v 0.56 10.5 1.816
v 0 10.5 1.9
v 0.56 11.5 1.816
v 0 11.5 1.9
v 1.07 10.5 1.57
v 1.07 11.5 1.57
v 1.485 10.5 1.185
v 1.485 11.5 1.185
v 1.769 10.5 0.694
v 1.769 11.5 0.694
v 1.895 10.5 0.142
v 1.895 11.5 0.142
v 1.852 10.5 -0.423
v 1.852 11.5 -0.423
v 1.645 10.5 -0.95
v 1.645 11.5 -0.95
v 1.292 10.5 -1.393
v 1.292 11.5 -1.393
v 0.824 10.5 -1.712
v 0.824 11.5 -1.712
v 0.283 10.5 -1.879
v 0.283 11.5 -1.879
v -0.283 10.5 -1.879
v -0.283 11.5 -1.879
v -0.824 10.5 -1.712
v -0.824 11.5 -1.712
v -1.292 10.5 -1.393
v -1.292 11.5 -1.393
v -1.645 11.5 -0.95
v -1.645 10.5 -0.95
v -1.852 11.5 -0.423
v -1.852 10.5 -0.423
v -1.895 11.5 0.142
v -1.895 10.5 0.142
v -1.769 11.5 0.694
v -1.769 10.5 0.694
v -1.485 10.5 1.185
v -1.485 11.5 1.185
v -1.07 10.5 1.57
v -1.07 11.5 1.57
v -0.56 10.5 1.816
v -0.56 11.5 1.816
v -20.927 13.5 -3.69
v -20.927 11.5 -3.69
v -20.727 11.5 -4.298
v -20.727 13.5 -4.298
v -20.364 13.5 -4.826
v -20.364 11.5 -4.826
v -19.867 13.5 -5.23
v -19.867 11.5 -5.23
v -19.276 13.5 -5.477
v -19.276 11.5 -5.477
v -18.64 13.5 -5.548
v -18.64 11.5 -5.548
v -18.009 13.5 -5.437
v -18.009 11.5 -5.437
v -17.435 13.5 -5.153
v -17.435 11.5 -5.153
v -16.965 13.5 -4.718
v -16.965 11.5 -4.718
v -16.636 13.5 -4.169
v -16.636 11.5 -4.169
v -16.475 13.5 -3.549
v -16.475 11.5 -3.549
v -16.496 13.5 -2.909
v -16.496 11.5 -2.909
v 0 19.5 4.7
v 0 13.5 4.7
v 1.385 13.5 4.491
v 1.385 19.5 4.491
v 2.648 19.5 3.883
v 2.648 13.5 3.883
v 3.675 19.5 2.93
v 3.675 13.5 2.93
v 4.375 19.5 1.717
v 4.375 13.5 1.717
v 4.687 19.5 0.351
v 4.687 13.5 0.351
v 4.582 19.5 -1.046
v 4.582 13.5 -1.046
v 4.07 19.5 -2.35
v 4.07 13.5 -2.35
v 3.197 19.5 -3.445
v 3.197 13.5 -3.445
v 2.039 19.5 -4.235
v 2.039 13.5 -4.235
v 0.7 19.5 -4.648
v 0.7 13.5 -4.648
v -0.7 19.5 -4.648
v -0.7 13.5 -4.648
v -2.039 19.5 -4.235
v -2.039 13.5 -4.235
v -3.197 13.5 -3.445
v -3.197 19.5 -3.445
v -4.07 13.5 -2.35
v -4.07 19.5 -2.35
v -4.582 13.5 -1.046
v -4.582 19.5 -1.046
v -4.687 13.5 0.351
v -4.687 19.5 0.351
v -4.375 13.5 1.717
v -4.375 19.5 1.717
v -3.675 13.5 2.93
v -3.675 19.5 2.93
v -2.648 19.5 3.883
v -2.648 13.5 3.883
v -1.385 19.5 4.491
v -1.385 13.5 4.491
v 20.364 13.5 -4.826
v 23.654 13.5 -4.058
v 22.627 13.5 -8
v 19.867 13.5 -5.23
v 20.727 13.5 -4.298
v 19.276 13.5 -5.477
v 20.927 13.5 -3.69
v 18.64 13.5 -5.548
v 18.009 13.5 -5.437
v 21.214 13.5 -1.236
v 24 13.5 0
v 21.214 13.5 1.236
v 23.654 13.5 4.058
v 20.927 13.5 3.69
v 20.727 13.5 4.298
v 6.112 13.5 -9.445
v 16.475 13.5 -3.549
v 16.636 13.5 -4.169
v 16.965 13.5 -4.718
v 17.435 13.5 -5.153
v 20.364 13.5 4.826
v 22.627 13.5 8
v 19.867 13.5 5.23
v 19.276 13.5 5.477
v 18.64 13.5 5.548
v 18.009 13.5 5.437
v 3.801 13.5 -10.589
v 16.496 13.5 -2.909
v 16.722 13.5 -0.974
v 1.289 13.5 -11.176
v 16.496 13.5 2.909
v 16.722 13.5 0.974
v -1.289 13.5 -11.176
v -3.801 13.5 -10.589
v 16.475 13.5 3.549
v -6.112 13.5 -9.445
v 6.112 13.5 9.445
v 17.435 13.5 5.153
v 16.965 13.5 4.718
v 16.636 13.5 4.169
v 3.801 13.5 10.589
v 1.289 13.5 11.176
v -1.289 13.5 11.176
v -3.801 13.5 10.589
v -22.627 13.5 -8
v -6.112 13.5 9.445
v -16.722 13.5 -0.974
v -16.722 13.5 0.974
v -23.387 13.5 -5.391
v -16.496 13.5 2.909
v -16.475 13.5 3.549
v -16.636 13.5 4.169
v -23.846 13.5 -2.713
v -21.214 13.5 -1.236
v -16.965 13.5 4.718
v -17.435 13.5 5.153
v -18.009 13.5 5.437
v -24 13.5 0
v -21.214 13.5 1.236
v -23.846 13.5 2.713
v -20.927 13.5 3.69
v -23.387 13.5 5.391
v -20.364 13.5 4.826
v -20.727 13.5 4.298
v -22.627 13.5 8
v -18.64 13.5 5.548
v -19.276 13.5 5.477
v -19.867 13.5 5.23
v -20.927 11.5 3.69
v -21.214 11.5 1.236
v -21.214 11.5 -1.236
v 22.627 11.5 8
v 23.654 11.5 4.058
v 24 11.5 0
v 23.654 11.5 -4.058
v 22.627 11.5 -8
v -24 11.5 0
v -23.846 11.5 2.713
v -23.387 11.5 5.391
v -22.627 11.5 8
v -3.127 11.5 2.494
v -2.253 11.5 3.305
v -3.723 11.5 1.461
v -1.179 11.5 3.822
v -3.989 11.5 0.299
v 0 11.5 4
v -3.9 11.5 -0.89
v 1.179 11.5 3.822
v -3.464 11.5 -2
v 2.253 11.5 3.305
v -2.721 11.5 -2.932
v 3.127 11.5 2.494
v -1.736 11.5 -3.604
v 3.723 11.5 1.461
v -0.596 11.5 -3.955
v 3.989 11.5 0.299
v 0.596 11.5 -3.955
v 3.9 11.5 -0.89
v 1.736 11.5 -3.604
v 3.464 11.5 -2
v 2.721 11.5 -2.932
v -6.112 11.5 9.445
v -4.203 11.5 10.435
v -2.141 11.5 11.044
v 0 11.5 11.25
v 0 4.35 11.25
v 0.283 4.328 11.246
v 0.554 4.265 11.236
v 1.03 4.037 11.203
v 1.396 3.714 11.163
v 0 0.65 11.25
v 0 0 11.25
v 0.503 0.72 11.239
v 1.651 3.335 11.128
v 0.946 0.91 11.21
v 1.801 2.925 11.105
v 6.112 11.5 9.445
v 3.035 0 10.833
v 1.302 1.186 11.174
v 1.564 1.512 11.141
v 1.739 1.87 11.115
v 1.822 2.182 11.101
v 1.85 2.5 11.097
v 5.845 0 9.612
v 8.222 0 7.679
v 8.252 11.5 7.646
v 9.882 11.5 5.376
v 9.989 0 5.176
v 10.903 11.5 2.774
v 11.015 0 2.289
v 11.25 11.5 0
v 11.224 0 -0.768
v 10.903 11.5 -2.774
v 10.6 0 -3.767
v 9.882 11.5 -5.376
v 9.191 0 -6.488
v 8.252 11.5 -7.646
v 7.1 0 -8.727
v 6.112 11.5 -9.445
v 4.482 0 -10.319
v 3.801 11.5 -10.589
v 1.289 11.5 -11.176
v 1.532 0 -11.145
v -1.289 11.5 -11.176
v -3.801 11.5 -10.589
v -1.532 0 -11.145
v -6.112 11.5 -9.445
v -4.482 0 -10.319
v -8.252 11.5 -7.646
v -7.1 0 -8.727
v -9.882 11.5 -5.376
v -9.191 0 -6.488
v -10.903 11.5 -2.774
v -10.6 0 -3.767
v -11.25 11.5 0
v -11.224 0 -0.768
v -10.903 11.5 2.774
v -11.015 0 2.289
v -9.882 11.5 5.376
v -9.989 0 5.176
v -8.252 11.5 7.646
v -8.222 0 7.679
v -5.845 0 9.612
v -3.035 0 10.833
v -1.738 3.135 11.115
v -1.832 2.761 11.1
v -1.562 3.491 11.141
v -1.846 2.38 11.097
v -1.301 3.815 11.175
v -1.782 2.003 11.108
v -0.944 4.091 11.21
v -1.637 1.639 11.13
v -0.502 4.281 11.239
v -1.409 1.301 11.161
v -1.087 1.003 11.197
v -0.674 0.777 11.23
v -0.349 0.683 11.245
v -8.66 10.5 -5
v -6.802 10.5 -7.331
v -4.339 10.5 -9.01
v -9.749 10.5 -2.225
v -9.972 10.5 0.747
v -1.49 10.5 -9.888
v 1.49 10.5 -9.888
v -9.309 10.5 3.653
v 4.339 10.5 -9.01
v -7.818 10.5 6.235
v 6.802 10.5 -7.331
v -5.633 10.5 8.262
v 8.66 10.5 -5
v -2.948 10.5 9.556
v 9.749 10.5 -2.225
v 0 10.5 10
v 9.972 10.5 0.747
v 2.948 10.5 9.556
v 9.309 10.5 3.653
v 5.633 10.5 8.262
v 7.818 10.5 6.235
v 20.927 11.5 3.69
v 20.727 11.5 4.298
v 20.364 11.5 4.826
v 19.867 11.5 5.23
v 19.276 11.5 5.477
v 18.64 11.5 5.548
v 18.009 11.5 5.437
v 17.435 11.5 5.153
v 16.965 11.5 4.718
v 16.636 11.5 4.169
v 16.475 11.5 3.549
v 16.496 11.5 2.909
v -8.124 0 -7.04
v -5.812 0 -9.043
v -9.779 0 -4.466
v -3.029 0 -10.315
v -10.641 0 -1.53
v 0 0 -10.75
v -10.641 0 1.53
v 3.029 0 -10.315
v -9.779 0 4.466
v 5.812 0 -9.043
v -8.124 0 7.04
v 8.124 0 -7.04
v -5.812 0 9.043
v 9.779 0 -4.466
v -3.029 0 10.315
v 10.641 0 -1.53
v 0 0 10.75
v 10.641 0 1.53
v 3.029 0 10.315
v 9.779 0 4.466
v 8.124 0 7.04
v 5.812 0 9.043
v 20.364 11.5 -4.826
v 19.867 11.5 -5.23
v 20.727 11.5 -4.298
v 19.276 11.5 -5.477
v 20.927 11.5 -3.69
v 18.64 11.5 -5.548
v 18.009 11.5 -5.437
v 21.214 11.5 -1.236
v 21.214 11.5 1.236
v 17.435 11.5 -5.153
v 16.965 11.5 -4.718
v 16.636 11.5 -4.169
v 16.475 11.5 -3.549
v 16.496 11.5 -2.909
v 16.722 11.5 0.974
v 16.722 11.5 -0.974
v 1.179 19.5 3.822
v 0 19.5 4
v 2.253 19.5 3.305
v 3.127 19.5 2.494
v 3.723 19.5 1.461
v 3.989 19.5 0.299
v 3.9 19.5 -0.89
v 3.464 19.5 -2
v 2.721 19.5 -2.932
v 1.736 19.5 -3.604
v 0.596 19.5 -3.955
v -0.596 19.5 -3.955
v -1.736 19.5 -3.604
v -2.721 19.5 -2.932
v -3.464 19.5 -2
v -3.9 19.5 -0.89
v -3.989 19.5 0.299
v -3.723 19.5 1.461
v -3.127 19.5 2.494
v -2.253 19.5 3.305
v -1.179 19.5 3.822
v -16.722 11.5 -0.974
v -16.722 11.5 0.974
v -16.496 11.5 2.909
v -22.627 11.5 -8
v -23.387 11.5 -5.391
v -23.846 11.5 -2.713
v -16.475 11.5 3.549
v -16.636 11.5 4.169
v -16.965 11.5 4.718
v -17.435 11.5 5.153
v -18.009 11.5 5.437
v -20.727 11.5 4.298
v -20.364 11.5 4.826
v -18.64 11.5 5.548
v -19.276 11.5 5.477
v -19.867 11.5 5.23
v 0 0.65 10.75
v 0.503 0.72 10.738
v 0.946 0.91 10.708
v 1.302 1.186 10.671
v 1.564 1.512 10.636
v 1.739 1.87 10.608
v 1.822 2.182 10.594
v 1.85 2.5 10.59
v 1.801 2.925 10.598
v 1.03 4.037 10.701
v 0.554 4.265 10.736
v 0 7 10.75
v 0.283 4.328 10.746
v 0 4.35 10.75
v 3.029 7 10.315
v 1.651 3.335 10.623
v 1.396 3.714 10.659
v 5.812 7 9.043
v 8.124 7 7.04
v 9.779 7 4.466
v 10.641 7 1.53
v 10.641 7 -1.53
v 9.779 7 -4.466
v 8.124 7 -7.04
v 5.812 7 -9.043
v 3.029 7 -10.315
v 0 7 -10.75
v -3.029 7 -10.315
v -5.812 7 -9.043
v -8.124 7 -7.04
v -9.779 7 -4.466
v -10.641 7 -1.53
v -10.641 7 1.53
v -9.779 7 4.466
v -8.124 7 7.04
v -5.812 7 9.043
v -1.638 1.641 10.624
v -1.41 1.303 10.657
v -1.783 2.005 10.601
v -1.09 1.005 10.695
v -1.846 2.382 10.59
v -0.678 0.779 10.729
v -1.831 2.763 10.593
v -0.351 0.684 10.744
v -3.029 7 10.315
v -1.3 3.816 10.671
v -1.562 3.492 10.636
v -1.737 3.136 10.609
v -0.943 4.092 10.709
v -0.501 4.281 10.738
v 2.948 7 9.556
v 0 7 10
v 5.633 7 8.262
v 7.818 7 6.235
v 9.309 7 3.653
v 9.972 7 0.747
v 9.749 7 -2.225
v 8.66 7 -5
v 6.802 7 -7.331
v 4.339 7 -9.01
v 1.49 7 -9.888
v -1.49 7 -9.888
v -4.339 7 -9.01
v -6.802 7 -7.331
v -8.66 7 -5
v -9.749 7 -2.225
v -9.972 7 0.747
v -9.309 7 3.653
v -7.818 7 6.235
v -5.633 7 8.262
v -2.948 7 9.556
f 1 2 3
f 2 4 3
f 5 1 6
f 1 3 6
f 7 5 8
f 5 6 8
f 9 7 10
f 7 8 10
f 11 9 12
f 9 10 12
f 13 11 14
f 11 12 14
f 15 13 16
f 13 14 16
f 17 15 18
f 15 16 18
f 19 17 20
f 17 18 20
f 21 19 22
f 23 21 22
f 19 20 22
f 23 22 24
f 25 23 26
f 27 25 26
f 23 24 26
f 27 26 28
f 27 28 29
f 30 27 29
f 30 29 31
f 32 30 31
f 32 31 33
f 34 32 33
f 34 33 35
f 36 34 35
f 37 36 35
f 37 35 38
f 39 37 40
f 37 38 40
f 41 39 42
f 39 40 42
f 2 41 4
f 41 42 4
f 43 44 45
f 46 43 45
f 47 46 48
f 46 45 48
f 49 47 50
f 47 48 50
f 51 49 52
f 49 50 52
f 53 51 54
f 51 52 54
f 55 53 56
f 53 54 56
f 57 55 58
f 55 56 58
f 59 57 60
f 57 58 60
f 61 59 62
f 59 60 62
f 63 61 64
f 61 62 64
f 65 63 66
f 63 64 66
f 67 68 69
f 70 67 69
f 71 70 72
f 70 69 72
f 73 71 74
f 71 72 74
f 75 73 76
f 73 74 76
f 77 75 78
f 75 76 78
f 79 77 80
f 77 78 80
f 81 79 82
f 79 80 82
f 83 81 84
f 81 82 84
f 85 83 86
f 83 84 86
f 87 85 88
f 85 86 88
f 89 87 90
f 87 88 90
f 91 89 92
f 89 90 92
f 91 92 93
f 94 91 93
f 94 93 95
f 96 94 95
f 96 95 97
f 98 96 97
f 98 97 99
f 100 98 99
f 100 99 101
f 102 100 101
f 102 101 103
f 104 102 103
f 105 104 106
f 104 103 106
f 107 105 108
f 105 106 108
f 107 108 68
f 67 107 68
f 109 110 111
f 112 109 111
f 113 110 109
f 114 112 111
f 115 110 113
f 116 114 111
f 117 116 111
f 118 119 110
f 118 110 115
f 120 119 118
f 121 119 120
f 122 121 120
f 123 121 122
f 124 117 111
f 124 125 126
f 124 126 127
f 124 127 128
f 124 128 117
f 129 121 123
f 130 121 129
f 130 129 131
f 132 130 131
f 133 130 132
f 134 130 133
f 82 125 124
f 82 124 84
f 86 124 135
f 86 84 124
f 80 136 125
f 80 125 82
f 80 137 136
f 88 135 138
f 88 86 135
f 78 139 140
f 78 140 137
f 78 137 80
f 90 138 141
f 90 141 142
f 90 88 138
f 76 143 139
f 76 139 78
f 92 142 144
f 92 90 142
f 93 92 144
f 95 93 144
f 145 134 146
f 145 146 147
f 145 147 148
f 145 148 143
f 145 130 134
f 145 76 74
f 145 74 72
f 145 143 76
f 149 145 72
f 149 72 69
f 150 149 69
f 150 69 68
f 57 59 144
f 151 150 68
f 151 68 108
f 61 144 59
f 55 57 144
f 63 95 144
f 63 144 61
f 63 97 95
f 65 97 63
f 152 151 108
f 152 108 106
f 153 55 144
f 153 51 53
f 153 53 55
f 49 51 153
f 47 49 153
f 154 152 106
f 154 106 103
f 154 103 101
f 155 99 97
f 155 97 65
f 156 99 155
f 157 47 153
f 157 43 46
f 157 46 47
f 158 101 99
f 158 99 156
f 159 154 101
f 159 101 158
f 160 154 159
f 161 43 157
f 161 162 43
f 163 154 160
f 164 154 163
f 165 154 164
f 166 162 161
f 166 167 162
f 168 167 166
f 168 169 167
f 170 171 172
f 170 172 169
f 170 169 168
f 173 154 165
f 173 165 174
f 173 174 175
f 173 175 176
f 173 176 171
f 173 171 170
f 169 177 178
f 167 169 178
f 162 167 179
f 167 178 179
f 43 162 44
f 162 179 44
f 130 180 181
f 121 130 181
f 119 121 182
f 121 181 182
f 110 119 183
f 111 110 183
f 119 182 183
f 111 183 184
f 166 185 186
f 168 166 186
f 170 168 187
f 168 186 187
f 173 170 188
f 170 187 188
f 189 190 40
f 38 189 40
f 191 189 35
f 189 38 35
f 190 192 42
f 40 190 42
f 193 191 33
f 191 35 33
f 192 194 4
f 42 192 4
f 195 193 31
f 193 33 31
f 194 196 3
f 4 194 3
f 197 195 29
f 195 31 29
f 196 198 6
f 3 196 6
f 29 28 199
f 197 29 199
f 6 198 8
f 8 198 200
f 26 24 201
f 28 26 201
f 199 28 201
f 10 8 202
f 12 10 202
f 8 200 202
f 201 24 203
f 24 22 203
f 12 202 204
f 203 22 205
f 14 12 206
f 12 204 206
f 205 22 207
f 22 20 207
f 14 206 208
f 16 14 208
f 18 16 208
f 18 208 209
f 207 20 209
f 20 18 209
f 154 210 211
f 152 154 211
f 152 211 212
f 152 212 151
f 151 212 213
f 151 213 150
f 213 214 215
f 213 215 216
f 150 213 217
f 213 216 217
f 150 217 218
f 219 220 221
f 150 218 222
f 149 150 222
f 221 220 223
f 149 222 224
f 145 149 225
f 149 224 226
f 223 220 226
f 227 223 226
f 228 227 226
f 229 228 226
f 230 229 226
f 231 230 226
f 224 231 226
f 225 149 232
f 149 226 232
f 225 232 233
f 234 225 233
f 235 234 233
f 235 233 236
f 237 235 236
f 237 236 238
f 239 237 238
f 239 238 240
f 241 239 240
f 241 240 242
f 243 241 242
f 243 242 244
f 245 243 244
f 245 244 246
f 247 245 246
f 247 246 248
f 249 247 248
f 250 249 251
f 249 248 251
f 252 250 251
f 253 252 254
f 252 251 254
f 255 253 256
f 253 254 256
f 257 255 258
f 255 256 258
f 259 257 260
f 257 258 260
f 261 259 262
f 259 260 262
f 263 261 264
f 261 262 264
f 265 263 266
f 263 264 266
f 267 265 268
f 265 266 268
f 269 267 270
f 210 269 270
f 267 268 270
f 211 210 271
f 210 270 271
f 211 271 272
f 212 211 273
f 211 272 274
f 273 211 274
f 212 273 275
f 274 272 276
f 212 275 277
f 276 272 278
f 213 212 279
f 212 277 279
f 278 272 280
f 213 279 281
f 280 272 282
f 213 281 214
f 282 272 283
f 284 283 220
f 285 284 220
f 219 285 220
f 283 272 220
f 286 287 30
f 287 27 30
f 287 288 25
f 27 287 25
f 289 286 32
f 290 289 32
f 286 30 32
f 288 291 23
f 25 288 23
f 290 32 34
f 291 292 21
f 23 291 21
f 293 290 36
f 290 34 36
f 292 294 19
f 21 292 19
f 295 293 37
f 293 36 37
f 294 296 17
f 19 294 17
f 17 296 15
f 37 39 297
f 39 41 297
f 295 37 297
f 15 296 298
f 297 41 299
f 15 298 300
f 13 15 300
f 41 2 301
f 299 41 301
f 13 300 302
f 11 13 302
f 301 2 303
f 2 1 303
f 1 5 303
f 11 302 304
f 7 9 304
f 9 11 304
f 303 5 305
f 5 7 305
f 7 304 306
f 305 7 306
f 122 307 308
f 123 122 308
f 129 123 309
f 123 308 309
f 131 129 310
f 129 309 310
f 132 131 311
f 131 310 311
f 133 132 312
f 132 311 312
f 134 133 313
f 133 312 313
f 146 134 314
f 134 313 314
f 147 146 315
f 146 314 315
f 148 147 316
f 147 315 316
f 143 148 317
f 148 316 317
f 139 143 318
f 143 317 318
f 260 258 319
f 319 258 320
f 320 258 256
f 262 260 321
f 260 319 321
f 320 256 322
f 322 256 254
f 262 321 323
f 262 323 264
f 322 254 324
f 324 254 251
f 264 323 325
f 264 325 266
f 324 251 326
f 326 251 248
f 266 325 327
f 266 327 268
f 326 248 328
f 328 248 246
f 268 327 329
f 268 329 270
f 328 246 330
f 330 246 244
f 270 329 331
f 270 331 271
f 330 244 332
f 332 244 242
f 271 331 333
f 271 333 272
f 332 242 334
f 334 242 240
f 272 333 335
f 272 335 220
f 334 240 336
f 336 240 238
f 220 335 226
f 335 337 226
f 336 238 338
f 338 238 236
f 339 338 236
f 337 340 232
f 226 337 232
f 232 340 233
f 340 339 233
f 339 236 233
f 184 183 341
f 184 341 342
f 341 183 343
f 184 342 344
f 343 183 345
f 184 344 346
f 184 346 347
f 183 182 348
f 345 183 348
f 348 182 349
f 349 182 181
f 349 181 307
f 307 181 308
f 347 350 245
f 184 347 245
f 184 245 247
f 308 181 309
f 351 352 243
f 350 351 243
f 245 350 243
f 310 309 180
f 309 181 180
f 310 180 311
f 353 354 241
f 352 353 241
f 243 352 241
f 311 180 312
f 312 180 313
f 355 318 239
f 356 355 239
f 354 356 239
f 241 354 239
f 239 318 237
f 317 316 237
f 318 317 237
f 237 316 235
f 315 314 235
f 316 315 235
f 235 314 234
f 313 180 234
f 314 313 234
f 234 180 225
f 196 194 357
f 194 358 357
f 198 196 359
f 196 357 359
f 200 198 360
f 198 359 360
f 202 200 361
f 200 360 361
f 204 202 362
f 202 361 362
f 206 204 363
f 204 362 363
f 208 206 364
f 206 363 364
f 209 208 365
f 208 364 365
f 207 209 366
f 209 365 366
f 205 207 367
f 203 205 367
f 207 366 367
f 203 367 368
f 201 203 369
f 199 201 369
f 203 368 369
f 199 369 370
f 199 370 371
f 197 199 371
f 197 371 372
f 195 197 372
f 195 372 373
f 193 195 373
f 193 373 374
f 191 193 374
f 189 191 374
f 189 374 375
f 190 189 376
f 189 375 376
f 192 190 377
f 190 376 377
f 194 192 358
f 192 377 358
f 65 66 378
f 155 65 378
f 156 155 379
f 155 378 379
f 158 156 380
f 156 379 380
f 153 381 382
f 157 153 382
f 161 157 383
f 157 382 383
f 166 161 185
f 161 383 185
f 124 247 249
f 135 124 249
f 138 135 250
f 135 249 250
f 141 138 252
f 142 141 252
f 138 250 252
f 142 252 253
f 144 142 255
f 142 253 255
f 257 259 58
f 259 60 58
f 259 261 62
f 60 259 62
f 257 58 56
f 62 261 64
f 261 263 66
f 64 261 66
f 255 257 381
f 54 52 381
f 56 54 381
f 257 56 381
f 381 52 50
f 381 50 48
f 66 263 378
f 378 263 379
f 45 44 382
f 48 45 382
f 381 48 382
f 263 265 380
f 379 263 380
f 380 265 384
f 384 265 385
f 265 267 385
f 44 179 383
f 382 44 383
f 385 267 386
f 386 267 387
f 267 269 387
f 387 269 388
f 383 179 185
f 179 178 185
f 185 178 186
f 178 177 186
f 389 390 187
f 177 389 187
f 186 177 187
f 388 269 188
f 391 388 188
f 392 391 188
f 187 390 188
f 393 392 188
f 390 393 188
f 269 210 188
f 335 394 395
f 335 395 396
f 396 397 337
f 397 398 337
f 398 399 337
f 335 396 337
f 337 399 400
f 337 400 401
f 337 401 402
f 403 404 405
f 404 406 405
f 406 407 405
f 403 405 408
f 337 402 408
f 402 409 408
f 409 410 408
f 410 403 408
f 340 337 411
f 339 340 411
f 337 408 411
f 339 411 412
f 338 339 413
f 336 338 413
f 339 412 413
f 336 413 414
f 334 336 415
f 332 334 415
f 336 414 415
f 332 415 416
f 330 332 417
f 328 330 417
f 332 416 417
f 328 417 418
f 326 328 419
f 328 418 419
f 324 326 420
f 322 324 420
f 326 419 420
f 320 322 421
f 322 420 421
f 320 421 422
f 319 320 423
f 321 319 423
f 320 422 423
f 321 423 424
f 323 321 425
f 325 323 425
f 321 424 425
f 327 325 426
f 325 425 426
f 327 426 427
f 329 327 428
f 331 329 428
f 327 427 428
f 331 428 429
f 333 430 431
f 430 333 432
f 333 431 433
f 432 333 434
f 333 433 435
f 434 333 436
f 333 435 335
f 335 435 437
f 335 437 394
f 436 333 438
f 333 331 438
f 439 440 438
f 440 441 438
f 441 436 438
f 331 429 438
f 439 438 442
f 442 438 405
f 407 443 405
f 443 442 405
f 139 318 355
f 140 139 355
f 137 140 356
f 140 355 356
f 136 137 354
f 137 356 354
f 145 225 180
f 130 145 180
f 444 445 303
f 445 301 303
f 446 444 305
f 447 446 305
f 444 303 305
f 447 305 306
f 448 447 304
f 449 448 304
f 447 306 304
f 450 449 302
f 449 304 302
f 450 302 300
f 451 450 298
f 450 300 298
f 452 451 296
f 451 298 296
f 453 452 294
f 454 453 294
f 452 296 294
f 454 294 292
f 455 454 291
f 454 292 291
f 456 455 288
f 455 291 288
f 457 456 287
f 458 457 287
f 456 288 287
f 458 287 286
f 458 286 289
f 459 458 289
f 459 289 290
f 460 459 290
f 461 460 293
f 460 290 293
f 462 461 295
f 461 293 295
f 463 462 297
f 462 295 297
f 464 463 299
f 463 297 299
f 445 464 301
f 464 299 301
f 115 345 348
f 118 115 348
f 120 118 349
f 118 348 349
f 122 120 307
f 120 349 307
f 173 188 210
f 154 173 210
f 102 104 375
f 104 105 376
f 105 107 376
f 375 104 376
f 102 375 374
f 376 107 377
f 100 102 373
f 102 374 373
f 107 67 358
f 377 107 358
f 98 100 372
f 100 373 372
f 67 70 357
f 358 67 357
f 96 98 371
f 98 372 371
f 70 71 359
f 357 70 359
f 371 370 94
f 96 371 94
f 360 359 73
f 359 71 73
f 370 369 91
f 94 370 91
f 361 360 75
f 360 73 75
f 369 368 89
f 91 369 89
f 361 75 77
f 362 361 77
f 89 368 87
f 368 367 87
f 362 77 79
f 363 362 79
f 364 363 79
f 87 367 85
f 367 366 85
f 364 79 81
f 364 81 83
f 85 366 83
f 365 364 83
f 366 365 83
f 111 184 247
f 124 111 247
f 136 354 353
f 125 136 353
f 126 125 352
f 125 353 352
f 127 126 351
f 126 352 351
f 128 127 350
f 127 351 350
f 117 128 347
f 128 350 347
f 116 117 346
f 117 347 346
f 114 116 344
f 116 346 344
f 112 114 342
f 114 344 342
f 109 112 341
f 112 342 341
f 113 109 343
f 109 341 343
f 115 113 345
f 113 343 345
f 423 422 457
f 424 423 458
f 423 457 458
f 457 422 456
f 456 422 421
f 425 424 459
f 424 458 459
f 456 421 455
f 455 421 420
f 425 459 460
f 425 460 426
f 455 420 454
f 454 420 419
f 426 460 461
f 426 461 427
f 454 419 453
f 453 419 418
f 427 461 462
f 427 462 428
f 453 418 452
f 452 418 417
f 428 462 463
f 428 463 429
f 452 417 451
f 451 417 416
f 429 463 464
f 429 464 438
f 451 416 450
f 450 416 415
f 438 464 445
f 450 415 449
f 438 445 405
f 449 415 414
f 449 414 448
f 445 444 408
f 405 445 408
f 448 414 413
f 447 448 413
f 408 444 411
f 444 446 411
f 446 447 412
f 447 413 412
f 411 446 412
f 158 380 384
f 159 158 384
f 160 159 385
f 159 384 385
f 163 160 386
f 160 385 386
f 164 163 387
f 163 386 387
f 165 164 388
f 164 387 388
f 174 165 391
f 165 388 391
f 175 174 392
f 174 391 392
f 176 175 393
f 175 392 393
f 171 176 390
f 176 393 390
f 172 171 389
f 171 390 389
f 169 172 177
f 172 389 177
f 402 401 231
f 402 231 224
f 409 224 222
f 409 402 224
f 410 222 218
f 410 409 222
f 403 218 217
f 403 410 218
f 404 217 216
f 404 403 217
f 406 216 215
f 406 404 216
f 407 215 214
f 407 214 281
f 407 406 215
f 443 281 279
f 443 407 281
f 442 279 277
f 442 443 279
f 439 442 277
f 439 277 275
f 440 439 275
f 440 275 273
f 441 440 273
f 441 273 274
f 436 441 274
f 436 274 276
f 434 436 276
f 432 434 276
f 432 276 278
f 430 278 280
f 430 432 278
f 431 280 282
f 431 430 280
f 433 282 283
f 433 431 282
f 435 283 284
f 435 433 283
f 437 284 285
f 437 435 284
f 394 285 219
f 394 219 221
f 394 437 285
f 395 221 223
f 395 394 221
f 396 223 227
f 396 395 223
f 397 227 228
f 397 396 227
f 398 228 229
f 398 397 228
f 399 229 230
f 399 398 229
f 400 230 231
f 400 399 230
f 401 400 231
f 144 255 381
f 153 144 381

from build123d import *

# Parameters (mm, degrees)
F2_R     = 1.85
F3_DEPTH = 11.251
F4_R     = 4.7
F5_DEPTH = 2


with BuildPart() as f1:
    # F0 (on Right) → F1 (revolve)
    with BuildSketch(Plane.YZ):
        Polygon((11.5, 11.25), (0, 11.25), (0, 10.75), (7, 10.75), (7, 10), (10.5, 10), (10.5, 1.9), (11.5, 1.9), (11.5, 4), (19.5, 4), (19.5, 4.7), (11.5, 4.7), align=None)
    revolve(axis=Axis((0, 13.454885222, 0), (0, 1, 0)))

    # F2 (on Top) → F3 (cut, through all)
    with BuildSketch(Plane.XY):
        with Locations((0, 2.5)):
            Circle(F2_R)
    extrude(amount=F3_DEPTH, mode=Mode.SUBTRACT)

    # F4 (on face) → F5 (join)
    with BuildSketch(Plane(origin=(0, 11.5, 0), x_dir=(-1, 0, 0), z_dir=(0, 1, 0))):
        with BuildLine():
            ThreePointArc((22.627416998, -8), (23.6543654317, -4.0584474894), (24, 0))
            ThreePointArc((24, 0), (23.6543654317, 4.0584474894), (22.627416998, 8))
            Line((22.627416998, 8), (6.1119619567, 9.4449150891))
            ThreePointArc((6.1119619567, 9.4449150891), (9.88235984, 5.3760081839), (11.25, 0))
            ThreePointArc((11.25, 0), (9.88235984, -5.3760081839), (6.1119619567, -9.4449150891))
            Line((6.1119619567, -9.4449150891), (22.627416998, -8))
        make_face()
        with BuildLine():
            ThreePointArc((16.495529863, 2.9086069759), (18.3206389075, 5.5151328199), (20.9271647515, 3.6900237754))
            ThreePointArc((20.9271647515, 3.6900237754), (21.25, 0), (20.9271647515, -3.6900237754))
            ThreePointArc((20.9271647515, -3.6900237754), (18.3206389075, -5.5151328199), (16.495529863, -2.9086069759))
            ThreePointArc((16.495529863, -2.9086069759), (16.75, 0), (16.495529863, 2.9086069759))
        make_face(mode=Mode.SUBTRACT)
        with BuildLine():
            Line((-6.1119619567, 9.4449150891), (-22.627416998, 8))
            ThreePointArc((-22.627416998, 8), (-24, 0), (-22.627416998, -8))
            Line((-22.627416998, -8), (-6.1119619567, -9.4449150891))
            ThreePointArc((-6.1119619567, -9.4449150891), (-11.25, 0), (-6.1119619567, 9.4449150891))
        make_face()
        with BuildLine():
            ThreePointArc((-16.495529863, -2.9086069759), (-18.3206389075, -5.5151328199), (-20.9271647515, -3.6900237754))
            ThreePointArc((-20.9271647515, -3.6900237754), (-21.25, 0), (-20.9271647515, 3.6900237754))
            ThreePointArc((-20.9271647515, 3.6900237754), (-18.3206389075, 5.5151328199), (-16.495529863, 2.9086069759))
            ThreePointArc((-16.495529863, 2.9086069759), (-16.75, 0), (-16.495529863, -2.9086069759))
        make_face(mode=Mode.SUBTRACT)
        with BuildLine():
            ThreePointArc((11.25, 0), (9.88235984, 5.3760081839), (6.1119619567, 9.4449150891))
            ThreePointArc((6.1119619567, 9.4449150891), (0, 11.25), (-6.1119619567, 9.4449150891))
            ThreePointArc((-6.1119619567, 9.4449150891), (-11.25, 0), (-6.1119619567, -9.4449150891))
            ThreePointArc((-6.1119619567, -9.4449150891), (0, -11.25), (6.1119619567, -9.4449150891))
            ThreePointArc((6.1119619567, -9.4449150891), (9.88235984, -5.3760081839), (11.25, 0))
        make_face()
        Circle(F4_R, mode=Mode.SUBTRACT)
    extrude(amount=F5_DEPTH)


solid = f1.part
